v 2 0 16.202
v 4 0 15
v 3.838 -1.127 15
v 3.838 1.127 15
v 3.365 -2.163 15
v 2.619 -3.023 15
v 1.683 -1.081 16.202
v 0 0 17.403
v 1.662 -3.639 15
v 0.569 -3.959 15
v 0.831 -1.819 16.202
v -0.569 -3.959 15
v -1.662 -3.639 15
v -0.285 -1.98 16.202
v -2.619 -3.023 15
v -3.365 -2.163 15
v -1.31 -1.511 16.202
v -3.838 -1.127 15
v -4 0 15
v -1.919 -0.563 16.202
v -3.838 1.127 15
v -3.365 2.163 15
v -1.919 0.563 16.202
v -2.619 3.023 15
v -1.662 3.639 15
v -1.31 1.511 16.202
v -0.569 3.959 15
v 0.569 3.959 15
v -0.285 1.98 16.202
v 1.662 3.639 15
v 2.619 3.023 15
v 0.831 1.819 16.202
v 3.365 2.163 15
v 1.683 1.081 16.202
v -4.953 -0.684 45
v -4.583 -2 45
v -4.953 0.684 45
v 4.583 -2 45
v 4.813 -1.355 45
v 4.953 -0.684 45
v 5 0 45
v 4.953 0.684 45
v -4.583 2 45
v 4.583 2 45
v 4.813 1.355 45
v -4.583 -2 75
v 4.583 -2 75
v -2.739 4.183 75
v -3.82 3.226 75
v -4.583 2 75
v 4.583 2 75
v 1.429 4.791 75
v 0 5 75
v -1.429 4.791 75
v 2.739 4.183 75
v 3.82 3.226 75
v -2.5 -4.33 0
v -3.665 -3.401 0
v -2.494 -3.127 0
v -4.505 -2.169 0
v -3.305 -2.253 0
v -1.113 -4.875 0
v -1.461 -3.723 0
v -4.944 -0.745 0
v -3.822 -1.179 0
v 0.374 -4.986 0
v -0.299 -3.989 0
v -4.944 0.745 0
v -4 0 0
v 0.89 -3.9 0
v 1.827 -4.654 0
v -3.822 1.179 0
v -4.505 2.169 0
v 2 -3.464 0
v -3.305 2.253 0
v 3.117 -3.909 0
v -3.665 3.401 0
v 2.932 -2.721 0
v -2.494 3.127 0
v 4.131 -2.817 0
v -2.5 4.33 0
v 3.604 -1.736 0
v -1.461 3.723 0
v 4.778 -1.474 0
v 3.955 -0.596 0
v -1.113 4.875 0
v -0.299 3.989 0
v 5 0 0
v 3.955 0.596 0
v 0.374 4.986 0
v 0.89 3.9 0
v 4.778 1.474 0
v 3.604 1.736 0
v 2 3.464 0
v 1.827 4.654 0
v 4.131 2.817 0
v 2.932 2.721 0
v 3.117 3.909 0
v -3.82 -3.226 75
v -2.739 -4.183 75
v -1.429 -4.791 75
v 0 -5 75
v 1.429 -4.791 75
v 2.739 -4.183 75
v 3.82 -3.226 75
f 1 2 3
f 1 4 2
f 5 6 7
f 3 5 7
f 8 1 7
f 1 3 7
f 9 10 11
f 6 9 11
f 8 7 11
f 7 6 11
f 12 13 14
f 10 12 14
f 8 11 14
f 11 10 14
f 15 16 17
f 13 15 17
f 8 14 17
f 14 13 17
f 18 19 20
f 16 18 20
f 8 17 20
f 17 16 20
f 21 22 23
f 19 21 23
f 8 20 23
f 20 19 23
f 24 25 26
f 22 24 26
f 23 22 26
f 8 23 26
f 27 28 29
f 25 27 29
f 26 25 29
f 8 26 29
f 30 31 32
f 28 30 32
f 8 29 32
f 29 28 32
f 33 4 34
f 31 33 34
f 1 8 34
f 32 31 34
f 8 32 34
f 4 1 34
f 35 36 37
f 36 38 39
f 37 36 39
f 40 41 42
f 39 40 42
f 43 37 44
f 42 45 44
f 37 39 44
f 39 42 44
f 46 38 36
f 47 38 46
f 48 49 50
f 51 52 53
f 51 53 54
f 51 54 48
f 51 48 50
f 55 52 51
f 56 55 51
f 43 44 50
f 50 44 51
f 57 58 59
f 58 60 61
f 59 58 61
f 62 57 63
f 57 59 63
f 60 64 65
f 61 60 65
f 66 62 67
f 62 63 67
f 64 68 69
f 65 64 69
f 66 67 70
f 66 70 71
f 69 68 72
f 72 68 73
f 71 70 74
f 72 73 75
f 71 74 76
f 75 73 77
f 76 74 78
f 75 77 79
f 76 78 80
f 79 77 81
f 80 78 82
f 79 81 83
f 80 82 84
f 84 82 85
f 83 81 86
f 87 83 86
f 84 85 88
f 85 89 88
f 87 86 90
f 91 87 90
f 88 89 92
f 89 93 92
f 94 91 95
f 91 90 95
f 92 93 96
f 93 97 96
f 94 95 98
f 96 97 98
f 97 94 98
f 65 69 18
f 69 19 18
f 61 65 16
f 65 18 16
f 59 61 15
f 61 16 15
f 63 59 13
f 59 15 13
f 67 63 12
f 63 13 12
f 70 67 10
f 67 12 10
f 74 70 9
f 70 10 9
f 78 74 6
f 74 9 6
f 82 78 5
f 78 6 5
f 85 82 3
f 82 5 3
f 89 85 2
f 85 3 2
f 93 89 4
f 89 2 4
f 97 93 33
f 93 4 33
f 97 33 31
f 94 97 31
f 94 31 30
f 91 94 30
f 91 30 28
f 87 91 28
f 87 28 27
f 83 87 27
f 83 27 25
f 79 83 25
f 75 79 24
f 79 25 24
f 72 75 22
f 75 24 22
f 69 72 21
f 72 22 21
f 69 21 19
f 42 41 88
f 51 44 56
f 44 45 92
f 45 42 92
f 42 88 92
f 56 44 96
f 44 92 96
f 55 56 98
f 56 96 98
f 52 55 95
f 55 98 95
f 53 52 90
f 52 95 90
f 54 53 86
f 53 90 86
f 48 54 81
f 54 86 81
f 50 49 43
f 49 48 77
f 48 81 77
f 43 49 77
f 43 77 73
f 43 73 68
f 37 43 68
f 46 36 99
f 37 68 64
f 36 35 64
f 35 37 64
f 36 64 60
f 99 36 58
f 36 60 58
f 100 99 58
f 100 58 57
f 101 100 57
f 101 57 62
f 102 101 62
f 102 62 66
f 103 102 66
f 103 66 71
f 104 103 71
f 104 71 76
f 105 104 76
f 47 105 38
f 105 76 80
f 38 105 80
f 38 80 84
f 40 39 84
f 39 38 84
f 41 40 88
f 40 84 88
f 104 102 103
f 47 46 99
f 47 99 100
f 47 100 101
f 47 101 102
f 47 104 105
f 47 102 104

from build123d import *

# Parameters (mm, degrees)
F0_R     = 5
F1_DEPTH = 75
F3_D     = 8
F3_DEPTH = 15
F3_TIP   = 2.4034424761
F4_W     = 2
F4_H     = 30
F5_DEPTH = 12.5


with BuildPart() as f1:
    # F0 (on Top) → F1 (new body)
    with BuildSketch(Plane.XY):
        Circle(F0_R)
    extrude(amount=F1_DEPTH)

    # F3
    with Locations(Plane(origin=(0, 0, 0), x_dir=(1, 0, 0), z_dir=(0, 0, -1))):
        with Locations((0, 0)):
            Hole(F3_D / 2, depth=F3_DEPTH)
            with Locations((0, 0, -(F3_DEPTH + F3_TIP / 2))):  # 118° drill point
                Cone(0, F3_D / 2, F3_TIP, mode=Mode.SUBTRACT)

    # F4 (on Right) → F5 (cut, symmetric)
    with BuildSketch(Plane.YZ):
        with Locations((-1, 60)):
            Rectangle(F4_W, F4_H)
        with Locations((1, 60)):
            Rectangle(F4_W, F4_H)
    extrude(amount=F5_DEPTH, both=True, mode=Mode.SUBTRACT)


solid = f1.part
